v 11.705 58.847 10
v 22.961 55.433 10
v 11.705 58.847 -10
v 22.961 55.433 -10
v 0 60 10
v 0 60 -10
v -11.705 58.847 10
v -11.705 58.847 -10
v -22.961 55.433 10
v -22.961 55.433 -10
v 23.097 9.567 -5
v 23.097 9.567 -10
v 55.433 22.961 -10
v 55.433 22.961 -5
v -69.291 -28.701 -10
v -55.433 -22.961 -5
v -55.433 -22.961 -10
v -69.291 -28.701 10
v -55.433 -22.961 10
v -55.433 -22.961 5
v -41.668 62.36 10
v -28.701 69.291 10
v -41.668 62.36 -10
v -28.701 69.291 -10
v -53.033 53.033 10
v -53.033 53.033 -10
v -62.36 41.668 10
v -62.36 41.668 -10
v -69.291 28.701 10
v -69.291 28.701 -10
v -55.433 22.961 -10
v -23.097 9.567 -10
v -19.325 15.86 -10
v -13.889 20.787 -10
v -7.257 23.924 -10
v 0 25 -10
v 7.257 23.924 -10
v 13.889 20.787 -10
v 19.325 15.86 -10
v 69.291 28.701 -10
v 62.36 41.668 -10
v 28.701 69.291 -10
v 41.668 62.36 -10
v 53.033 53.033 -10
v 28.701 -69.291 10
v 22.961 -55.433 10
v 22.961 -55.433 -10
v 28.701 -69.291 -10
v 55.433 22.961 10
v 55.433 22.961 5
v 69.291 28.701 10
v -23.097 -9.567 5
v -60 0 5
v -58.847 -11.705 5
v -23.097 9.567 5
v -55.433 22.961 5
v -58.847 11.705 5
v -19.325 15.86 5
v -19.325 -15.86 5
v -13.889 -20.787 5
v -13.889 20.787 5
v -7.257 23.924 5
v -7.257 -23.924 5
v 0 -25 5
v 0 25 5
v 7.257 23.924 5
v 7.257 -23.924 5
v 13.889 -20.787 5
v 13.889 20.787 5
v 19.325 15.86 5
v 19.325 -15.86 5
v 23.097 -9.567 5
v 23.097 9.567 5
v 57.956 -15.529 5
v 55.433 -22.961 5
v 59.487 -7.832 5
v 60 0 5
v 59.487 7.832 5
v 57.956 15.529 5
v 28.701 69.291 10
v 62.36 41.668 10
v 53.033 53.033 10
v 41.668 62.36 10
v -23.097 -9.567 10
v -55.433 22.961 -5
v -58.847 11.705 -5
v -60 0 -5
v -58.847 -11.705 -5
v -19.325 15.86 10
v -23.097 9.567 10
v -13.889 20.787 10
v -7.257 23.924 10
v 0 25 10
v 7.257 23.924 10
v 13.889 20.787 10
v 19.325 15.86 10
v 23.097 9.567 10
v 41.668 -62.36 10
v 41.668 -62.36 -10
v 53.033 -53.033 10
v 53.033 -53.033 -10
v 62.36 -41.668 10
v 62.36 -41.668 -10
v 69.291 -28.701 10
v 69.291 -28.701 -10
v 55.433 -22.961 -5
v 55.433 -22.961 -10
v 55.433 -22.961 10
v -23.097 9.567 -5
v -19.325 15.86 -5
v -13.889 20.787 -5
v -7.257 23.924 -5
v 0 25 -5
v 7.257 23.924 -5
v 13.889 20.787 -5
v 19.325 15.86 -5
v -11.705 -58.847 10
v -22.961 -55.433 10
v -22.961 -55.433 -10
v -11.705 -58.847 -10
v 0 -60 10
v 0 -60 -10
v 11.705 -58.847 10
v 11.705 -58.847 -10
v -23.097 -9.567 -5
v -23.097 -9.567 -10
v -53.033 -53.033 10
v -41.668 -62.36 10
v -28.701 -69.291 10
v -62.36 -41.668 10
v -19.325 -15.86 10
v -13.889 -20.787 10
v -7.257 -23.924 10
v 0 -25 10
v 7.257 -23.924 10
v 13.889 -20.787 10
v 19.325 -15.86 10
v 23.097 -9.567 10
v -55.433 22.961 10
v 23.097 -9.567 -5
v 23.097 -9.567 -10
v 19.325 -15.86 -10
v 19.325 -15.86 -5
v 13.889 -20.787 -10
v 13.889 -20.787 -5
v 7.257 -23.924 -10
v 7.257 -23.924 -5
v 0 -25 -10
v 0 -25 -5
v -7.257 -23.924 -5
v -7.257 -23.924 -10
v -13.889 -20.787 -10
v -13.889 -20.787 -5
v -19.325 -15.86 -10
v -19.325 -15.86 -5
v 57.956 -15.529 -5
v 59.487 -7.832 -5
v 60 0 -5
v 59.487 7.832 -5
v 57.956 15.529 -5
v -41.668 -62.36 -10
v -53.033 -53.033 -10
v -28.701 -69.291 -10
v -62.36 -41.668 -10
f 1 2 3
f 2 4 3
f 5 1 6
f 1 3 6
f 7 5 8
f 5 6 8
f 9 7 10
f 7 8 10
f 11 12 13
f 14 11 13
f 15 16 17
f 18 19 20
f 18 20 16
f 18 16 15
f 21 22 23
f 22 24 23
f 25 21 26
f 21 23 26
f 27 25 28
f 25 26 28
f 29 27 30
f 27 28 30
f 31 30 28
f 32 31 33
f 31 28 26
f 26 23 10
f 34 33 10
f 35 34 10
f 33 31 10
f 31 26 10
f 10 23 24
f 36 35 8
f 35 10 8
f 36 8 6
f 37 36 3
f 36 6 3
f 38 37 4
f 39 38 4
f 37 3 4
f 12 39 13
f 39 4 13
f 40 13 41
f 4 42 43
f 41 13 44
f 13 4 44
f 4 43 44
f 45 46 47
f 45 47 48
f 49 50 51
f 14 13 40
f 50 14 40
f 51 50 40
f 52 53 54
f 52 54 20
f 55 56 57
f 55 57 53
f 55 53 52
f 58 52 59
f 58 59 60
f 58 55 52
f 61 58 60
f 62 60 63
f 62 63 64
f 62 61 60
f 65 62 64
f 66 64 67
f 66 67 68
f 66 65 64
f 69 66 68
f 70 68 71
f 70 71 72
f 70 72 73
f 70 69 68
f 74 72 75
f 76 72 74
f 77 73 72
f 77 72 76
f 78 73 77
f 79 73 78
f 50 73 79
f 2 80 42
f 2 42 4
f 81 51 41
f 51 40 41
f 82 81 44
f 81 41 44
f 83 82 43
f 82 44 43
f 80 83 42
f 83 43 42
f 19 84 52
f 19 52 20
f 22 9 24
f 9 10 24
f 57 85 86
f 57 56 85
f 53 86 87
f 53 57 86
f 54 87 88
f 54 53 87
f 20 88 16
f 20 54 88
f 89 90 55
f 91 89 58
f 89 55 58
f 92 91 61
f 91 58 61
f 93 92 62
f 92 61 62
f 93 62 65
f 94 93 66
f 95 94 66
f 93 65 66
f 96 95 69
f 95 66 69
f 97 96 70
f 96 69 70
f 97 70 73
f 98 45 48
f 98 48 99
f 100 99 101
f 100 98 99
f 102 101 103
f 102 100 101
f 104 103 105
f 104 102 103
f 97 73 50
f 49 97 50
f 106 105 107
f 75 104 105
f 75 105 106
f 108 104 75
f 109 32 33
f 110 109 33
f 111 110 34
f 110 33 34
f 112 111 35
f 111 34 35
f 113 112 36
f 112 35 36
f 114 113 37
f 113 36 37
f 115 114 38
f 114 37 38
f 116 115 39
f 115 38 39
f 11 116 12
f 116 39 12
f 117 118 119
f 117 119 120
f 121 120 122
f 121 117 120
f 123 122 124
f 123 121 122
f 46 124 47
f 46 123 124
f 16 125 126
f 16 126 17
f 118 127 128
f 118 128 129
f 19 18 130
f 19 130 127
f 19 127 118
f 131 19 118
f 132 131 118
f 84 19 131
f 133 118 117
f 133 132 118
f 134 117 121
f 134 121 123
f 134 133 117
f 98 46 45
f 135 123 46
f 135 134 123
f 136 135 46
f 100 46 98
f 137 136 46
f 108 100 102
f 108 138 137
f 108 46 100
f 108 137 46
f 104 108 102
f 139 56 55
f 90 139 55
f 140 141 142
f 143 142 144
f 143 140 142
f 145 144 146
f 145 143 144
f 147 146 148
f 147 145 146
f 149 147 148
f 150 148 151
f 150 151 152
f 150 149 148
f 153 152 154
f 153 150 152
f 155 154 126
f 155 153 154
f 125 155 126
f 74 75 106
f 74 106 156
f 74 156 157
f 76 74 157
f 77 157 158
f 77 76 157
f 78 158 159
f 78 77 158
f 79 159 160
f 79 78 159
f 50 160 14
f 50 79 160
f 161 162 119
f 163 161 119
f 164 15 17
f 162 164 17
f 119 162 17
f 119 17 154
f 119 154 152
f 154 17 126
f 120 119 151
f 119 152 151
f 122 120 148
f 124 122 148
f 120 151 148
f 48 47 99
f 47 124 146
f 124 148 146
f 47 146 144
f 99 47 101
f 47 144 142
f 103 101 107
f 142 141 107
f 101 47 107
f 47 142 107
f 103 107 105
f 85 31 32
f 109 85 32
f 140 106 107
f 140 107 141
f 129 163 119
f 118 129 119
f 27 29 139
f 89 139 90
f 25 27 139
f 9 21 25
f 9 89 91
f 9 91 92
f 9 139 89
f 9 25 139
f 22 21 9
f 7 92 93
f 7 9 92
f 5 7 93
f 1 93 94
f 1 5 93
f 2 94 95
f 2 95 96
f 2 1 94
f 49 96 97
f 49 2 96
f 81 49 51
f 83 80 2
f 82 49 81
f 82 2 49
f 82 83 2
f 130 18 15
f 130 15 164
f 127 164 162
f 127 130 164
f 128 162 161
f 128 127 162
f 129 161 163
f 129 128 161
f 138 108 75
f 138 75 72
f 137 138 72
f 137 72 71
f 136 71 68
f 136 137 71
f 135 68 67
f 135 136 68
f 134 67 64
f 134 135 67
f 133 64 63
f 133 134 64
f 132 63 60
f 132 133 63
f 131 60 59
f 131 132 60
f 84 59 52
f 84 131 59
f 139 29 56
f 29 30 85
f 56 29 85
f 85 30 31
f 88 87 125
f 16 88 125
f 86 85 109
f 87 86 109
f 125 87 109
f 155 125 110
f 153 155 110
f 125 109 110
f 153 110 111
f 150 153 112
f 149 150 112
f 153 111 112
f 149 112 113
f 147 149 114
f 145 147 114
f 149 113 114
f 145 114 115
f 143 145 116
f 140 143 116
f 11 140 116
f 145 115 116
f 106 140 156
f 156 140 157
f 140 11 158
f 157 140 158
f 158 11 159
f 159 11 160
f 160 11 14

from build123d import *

# Parameters (mm, degrees)
BOSS_EXTRUDE1_DEPTH   = 10
BOSS_EXTRUDE1_2_DEPTH = 10
BOSS_EXTRUDE2_DEPTH   = 5


with BuildPart() as part:
    # Sketch1 → Boss-Extrude1 (new, symmetric)
    with BuildSketch(Plane.XY):
        with BuildLine():
            ThreePointArc((23.096988313, -9.567085809), (0, -25), (-23.096988313, -9.567085809))
            Line((-23.096988313, -9.567085809), (-69.290964938, -28.701257427))
            ThreePointArc((-69.290964938, -28.701257427), (-53.033008589, -53.033008589), (-28.701257427, -69.290964938))
            Line((-28.701257427, -69.290964938), (-22.961005942, -55.432771951))
            ThreePointArc((-22.961005942, -55.432771951), (0, -60), (22.961005942, -55.432771951))
            Line((22.961005942, -55.432771951), (28.701257427, -69.290964938))
            ThreePointArc((28.701257427, -69.290964938), (53.033008589, -53.033008589), (69.290964938, -28.701257427))
            Line((69.290964938, -28.701257427), (23.096988313, -9.567085809))
        make_face()
    extrude(amount=BOSS_EXTRUDE1_DEPTH, both=True)



with BuildPart() as body_2:
    # Sketch1 → Boss-Extrude1 2 (new, symmetric)
    with BuildSketch(Plane.XY):
        with BuildLine():
            ThreePointArc((69.290964938, 28.701257427), (53.033008589, 53.033008589), (28.701257427, 69.290964938))
            Line((28.701257427, 69.290964938), (22.961005942, 55.432771951))
            ThreePointArc((22.961005942, 55.432771951), (0, 60), (-22.961005942, 55.432771951))
            Line((-22.961005942, 55.432771951), (-28.701257427, 69.290964938))
            ThreePointArc((-28.701257427, 69.290964938), (-53.033008589, 53.033008589), (-69.290964938, 28.701257427))
            Line((-69.290964938, 28.701257427), (-23.096988313, 9.567085809))
            ThreePointArc((-23.096988313, 9.567085809), (0, 25), (23.096988313, 9.567085809))
            Line((23.096988313, 9.567085809), (69.290964938, 28.701257427))
        make_face()
    extrude(amount=BOSS_EXTRUDE1_2_DEPTH, both=True)


with BuildPart() as part_1:
    add(part.part)

    add(body_2.part)  # Boss-Extrude2 merges body 2
    # Sketch1<3> → Boss-Extrude2 (add, symmetric)
    with BuildSketch(Plane.XY):
        with BuildLine():
            ThreePointArc((-23.096988313, -9.567085809), (0, -25), (23.096988313, -9.567085809))
            Line((23.096988313, -9.567085809), (55.432771951, -22.961005942))
            ThreePointArc((55.432771951, -22.961005942), (58.847116824, -11.705419321), (60, 0))
            ThreePointArc((60, 0), (58.847116824, 11.705419321), (55.432771951, 22.961005942))
            Line((55.432771951, 22.961005942), (23.096988313, 9.567085809))
            ThreePointArc((23.096988313, 9.567085809), (0, 25), (-23.096988313, 9.567085809))
            Line((-23.096988313, 9.567085809), (-55.432771951, 22.961005942))
            ThreePointArc((-55.432771951, 22.961005942), (-60, 0), (-55.432771951, -22.961005942))
            Line((-55.432771951, -22.961005942), (-23.096988313, -9.567085809))
        make_face()
    extrude(amount=BOSS_EXTRUDE2_DEPTH, both=True)


solid = part_1.part
